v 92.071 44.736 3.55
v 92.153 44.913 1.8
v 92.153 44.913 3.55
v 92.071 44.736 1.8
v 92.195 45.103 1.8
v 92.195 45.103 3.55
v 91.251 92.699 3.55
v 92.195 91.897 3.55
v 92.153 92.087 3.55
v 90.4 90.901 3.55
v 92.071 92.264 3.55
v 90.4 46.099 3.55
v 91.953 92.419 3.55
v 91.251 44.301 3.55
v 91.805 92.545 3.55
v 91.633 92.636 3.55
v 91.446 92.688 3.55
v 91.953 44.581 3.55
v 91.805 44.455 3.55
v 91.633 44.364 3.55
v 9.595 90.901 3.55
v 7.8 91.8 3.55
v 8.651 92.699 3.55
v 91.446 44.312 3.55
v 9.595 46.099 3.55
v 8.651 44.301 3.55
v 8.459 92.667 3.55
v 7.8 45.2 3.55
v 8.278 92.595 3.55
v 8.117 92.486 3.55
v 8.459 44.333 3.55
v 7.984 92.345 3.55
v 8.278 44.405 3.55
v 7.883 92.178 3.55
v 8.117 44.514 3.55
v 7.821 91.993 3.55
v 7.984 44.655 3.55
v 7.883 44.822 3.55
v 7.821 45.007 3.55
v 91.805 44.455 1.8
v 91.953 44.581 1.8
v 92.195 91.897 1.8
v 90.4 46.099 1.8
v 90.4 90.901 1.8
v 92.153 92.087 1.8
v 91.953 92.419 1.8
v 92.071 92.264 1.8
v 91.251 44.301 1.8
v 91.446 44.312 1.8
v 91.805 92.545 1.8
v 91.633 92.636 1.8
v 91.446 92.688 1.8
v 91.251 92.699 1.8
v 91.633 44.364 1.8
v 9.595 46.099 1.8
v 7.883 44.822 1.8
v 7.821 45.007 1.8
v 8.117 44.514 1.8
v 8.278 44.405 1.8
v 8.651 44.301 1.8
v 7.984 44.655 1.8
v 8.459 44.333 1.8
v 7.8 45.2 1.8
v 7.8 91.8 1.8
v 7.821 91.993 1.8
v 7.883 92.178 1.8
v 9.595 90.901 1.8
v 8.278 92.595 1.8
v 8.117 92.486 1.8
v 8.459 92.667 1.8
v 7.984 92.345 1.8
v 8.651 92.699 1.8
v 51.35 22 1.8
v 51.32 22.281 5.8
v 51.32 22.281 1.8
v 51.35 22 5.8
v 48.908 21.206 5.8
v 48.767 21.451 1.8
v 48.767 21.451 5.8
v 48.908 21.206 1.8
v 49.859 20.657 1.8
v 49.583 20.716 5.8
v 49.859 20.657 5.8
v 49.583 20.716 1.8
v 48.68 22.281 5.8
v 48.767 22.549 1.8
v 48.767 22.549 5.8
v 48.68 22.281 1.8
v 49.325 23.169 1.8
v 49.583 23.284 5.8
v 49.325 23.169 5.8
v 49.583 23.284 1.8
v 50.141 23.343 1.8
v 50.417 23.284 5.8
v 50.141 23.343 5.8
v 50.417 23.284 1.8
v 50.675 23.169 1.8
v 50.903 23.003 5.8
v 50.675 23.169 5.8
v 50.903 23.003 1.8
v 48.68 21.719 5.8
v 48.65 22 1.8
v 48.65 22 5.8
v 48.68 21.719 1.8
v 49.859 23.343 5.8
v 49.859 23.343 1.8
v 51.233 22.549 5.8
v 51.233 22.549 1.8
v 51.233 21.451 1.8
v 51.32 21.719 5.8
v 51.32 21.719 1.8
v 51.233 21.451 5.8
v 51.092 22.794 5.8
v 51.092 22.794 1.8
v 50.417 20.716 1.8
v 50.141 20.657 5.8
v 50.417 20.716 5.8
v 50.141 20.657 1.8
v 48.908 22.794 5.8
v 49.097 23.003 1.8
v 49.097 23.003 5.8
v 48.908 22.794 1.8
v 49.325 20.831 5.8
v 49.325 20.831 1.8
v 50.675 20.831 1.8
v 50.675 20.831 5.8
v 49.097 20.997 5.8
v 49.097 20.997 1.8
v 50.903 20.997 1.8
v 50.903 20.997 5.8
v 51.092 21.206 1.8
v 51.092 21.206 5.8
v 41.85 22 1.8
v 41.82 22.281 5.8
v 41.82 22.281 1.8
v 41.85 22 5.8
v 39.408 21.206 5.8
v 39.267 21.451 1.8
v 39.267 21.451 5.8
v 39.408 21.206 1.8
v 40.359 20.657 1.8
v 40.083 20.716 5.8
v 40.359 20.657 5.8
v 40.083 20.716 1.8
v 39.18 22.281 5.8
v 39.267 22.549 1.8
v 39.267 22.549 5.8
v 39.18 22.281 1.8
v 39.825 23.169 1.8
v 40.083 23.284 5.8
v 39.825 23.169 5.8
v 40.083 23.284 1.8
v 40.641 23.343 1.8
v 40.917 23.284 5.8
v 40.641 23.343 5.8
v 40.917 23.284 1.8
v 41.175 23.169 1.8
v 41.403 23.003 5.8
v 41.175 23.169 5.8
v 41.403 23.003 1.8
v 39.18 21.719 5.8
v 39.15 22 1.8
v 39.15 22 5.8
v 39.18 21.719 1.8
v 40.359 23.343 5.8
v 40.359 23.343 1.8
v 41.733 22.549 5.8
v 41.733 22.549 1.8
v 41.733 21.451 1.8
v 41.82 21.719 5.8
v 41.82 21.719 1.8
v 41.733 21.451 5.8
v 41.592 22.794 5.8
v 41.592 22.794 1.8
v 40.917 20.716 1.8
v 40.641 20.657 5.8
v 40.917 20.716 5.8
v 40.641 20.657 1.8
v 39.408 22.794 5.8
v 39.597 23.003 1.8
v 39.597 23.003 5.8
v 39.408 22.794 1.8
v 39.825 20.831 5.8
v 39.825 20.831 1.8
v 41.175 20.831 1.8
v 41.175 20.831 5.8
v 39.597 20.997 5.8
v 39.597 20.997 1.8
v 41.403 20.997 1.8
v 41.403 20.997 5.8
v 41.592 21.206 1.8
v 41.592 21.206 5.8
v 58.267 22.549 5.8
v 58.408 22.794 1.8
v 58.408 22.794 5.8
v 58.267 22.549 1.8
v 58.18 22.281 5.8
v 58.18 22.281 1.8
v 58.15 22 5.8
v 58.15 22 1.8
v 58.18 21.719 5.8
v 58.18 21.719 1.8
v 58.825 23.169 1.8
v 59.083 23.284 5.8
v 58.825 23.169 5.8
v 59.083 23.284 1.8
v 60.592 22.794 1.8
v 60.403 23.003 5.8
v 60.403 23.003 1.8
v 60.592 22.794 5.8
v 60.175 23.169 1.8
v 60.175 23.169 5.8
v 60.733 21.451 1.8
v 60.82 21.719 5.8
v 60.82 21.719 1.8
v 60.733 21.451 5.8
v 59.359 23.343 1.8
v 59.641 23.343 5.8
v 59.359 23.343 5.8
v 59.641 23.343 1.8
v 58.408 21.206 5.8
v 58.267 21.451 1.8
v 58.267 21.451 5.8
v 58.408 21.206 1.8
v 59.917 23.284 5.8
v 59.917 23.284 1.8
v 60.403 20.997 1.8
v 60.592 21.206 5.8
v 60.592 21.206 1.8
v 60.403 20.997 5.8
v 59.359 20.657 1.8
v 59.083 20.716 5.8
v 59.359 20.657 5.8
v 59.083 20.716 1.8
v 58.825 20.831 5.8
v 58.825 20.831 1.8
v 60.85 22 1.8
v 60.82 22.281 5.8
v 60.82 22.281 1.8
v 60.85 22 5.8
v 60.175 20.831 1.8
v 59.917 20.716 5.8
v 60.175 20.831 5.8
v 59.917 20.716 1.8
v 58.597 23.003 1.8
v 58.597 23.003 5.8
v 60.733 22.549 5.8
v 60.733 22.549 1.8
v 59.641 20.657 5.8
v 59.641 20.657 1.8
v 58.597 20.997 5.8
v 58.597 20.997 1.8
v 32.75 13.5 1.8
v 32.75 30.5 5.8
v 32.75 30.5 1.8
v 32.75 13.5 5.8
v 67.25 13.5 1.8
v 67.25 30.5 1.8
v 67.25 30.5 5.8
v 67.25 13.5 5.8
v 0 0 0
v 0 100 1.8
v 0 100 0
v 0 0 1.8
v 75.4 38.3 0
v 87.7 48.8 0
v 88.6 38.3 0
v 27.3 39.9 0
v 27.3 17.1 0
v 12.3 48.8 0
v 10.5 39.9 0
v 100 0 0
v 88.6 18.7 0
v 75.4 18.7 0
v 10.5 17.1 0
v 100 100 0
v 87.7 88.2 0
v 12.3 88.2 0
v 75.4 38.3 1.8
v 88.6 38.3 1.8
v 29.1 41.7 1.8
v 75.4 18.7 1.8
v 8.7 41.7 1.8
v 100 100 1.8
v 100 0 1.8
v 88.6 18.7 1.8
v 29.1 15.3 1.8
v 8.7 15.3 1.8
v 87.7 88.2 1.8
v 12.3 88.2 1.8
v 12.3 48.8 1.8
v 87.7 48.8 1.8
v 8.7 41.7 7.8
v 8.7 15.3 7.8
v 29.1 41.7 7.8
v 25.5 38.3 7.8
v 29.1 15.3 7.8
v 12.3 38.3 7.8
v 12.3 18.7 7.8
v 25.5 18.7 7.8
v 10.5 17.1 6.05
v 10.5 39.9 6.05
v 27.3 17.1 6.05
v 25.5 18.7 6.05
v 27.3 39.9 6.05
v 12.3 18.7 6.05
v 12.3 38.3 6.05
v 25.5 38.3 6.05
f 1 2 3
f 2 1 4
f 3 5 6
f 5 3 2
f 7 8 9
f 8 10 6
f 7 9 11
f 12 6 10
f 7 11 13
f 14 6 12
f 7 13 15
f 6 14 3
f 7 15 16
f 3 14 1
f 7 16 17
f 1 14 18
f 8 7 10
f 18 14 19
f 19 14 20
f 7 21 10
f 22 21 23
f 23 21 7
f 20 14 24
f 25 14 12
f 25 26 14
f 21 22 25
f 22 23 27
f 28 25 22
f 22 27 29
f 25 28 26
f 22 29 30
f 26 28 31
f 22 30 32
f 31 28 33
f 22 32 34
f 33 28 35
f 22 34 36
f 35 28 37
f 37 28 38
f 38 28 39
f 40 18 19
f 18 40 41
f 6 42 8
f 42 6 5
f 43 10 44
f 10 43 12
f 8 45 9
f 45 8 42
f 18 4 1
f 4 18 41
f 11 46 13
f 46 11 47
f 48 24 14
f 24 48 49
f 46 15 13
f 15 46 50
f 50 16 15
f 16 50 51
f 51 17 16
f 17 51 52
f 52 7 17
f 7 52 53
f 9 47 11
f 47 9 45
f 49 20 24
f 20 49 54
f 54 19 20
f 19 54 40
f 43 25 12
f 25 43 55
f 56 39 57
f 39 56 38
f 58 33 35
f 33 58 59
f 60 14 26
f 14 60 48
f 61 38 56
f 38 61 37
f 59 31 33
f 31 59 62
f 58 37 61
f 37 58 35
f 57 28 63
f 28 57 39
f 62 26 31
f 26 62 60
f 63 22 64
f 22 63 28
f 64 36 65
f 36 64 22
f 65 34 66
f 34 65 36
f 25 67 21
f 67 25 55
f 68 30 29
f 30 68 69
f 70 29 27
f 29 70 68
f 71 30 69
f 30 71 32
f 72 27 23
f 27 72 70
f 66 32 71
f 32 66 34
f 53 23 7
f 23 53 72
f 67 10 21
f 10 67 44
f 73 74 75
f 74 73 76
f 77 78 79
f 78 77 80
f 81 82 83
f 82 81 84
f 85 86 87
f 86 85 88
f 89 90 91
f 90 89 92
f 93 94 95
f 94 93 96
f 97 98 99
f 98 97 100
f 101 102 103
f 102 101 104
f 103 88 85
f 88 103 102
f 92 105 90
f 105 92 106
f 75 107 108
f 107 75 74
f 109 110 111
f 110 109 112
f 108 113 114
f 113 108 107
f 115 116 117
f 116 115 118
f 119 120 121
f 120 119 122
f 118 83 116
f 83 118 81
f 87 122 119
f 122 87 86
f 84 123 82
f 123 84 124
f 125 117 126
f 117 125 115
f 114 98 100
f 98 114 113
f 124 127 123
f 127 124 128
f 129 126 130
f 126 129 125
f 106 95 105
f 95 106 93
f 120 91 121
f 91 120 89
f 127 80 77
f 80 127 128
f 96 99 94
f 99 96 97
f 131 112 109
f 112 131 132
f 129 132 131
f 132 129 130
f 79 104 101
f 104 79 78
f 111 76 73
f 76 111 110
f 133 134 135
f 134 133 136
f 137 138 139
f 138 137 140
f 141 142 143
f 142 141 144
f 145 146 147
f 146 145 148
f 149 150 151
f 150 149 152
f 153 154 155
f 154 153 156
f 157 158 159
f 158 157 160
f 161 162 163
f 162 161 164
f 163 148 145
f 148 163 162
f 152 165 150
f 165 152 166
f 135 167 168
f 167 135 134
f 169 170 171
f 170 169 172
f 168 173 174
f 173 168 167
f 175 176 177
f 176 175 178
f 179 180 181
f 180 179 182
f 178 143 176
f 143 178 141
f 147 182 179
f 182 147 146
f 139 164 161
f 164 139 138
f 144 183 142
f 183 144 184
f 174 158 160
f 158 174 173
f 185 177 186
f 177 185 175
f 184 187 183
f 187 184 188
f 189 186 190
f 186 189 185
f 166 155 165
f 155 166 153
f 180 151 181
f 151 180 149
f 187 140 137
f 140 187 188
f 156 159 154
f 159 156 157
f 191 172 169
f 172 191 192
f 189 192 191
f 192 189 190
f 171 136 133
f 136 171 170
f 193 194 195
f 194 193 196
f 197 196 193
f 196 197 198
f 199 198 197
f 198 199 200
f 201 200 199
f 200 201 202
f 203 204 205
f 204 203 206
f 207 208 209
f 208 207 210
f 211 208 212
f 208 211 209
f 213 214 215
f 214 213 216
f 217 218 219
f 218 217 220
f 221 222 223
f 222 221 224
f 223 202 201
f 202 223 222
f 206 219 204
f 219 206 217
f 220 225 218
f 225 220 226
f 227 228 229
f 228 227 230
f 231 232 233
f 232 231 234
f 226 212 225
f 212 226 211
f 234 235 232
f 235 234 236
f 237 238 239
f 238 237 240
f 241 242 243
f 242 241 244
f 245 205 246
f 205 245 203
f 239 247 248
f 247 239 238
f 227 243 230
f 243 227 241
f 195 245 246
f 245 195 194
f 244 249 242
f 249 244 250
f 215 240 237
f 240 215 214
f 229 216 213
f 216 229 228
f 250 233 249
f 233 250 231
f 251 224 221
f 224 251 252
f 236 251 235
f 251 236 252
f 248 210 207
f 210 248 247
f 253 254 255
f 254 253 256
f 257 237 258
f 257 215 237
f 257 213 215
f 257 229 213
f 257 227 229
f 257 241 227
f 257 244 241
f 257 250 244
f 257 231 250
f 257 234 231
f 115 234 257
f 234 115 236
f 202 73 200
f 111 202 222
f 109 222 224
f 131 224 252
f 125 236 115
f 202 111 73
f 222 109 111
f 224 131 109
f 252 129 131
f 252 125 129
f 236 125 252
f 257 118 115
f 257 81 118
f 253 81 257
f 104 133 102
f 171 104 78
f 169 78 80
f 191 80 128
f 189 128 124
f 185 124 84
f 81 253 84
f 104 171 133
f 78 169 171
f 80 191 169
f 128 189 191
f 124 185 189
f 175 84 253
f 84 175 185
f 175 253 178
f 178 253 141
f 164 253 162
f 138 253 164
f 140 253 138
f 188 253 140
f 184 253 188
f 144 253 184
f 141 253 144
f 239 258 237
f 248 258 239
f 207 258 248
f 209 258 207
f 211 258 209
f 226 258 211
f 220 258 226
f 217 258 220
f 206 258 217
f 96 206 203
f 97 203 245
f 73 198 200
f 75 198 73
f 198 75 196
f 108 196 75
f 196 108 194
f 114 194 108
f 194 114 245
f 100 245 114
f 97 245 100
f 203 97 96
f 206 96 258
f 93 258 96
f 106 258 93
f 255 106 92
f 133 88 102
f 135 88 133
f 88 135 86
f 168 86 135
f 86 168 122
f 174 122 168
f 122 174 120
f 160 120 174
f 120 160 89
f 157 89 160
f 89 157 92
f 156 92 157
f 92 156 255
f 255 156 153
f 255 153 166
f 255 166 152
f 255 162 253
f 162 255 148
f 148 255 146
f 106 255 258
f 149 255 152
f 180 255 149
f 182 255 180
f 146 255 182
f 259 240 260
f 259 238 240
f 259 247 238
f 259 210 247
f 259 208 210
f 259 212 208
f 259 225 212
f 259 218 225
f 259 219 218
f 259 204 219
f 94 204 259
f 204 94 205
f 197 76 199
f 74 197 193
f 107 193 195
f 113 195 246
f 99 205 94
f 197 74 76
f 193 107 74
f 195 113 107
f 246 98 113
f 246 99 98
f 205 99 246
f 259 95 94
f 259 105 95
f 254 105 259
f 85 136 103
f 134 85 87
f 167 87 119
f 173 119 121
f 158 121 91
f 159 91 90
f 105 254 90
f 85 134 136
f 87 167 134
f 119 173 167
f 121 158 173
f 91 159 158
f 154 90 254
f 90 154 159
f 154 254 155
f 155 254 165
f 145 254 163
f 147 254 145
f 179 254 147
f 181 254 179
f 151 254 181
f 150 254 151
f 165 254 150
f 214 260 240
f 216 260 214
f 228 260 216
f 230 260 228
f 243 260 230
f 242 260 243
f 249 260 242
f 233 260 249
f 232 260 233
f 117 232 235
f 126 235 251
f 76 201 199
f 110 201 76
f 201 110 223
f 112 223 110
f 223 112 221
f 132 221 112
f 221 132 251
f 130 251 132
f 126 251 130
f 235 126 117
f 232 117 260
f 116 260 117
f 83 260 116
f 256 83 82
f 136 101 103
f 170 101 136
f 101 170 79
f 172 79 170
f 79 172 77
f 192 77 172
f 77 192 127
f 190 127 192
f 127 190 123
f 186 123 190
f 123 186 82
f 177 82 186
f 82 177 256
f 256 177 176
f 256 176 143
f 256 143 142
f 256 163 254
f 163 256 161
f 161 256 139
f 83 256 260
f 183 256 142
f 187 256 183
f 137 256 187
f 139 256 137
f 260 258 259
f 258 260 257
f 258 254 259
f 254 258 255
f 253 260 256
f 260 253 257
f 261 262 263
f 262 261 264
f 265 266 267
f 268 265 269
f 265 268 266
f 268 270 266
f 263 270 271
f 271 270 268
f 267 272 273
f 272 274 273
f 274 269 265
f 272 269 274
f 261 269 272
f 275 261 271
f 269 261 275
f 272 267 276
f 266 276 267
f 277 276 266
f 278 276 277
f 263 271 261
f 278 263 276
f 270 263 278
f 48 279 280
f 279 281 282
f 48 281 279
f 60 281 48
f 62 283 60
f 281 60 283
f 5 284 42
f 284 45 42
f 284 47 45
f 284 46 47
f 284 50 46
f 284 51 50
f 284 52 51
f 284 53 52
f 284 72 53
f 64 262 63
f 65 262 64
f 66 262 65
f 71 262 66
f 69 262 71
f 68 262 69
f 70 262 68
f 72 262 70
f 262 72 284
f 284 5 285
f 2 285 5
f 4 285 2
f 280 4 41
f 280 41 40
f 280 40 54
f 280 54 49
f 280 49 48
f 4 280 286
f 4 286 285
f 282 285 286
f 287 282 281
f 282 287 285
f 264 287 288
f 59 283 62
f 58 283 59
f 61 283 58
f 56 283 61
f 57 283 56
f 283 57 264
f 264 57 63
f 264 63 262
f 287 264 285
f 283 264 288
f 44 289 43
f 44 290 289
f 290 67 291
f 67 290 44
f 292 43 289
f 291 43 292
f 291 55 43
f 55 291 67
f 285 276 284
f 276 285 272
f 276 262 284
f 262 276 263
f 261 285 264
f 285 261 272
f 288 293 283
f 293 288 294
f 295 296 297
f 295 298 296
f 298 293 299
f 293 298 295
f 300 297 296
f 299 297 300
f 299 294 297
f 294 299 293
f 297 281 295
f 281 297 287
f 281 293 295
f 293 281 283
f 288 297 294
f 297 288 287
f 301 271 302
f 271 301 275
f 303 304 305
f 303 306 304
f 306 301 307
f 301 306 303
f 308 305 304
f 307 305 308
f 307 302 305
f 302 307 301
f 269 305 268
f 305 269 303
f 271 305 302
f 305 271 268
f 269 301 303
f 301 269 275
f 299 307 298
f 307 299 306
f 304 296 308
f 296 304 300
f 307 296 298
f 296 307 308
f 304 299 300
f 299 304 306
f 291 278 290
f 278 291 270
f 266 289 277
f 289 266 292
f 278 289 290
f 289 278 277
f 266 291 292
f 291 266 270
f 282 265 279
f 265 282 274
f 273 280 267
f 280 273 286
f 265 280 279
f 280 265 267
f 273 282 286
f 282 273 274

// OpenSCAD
// Control Panel for simple prop controller
// Adrian McCarthy 2023-02-12

module thread(h, tap_d, pitch, tooth_h, nozzle_d=0.4) {
    r = (tap_d + nozzle_d) / 2;

    facets =
        ($fn > 0) ? max(3, $fn)
                  : max(5, ceil(min(360/$fa, 2*PI*r / $fs)));
    dtheta = 360 / facets;
    echo(str("dtheta for threads = ", dtheta));

    module wedge() {
        rotate([1.5, 0, 0]) rotate([0, 0, -(dtheta+0.1)/2])
            rotate_extrude(angle=dtheta+0.1, convexity=10)
                translate([r, 0])
                    polygon([
                        [tooth_h, 0],
                        [0, -pitch/2],
                        [-0.1, -pitch/2],
                        [-0.1, pitch/2],
                        [0, pitch/2]
                    ]);
    }

    for (theta = [-180 : dtheta : h*360/pitch + 180]) {
        rotate([0, 0, theta]) translate([0, 0, pitch*theta/360])
            wedge();
    }
}


// Arcade Button
// https://www.adafruit.com/product/3489
//
function arcadebtn_size(panel_th=0) = [ 33.3, 33.3, 10 ];

module arcadebtn_support(panel_th, nozzle_d=0.4) {
    button_dia   = arcadebtn_size().x;
    button_depth = arcadebtn_size().z;
    translate([0, 0, panel_th/2 - button_depth])
        cylinder(h=button_depth, d=button_dia);
}

module arcadebtn_cutout(panel_th, nozzle_d=0.4) {
    button_dia   = arcadebtn_size().x;
    button_depth = arcadebtn_size().z;
    // Thread size is M28-2
    // https://www.geocities.ws/qxb4tech/mthreadfine1_28.html
    tap_d = 26;
    pitch = 2;
    tooth_h = 1.227;

    translate([0, 0, panel_th/2 - button_depth - 0.1]) {
        cylinder(h=button_depth+0.2, d=tap_d + nozzle_d);
        intersection() {
            cylinder(h=button_depth-3, d=button_dia);
            thread(h=button_depth-3, tap_d=tap_d, pitch=pitch,
                   tooth_h=tooth_h, nozzle_d=nozzle_d);
        }
        translate([0, 0, button_depth-3+0.1])
            cylinder(h=3+0.1, d=28);
    }
}


// Relay Module
// XY-WJ01 Programmable Relay
// https://www.mpja.com/download/35874rldata.pdf
function relaymod_size(panel_th=0) = [79, 43];

module relaymod_cutout(panel_th, nozzle_d=0.4) {
    cutout_w = 75 + nozzle_d;
    cutout_h = 39 + nozzle_d;
    cube([cutout_w, cutout_h, panel_th+0.1], center=true);
}

module relaymod_bracing(panel_th, nozzle_d=0.4) {
    brace_th = panel_th;
    margin = max(min(4, brace_th), brace_th/2);
    left = -(relaymod_size().x/2 + margin);
    top = relaymod_size().y/2 + margin;
    right = -left;
    bottom = -top;

    module brace(p0, p1) {
        translate([0, 0, -panel_th+0.1]) {
            linear_extrude(brace_th + 0.1, convexity=4, center=true) {
                hull() {
                    translate(p0) circle(d=brace_th, $fs=nozzle_d/2);
                    translate(p1) circle(d=brace_th, $fs=nozzle_d/2);
                }
            }
        }
    }

    brace([left, top],     [left, bottom]);
    brace([left, bottom],  [right, bottom]);
    brace([right, bottom], [right, top]);
    brace([right, top],    [left, top]);
}


// Rocker Switch
// Daier KCD-101 rocker switch
// https://www.chinadaier.com/kcd1-101-10-amp-rocker-switch/
function rocker_size(panel_th=0) = [15, 21];

module rocker_cutout(panel_th, nozzle_d=0.4) {
    cutout_w = 13.2;
    cutout_h = 19.2 + nozzle_d;
    cube([cutout_w, cutout_h, panel_th+0.1], center=true);
}

function recessed_rocker_size(panel_th) = [
    rocker_size(panel_th).x + panel_th,
    rocker_size(panel_th).y + panel_th, 6
];

module recessed_rocker_support(panel_th, nozzle_d=0.4) {
    support_w = recessed_rocker_size(panel_th).x + 2*panel_th;
    support_h = recessed_rocker_size(panel_th).y + 2*panel_th;
    support_d = recessed_rocker_size(panel_th).z + panel_th;
    translate([0, 0, (panel_th - support_d)/2])
        cube([support_w, support_h, support_d], center=true);
}

module recessed_rocker_cutout(panel_th, nozzle_d=0.4) {
    recess_w = recessed_rocker_size(panel_th).x;
    recess_h = recessed_rocker_size(panel_th).y;
    recess_d = recessed_rocker_size(panel_th).z;
    translate([0, 0, (panel_th - recess_d)/2]) {
        cube([recess_w, recess_h, recess_d+0.1], center=true);
        translate([0, 0, -(recess_d+panel_th)/2])
            rocker_cutout(panel_th, nozzle_d);
    }        
}
    

// Terminal Block
// This is for smallish "European" style screw terminals.
module terminal_block_support(channels=4, panel_th, nozzle_d=0.4) {
    terminal_w = 6;
    spacer_w   = 3.5;
    support_w = terminal_w*channels + spacer_w*(channels-1);
    support_h = 17;
    support_d = 4;
    translate([0, 0, -(support_d + panel_th)/2]) {
        difference() {
            cube([support_w, support_h, support_d], center=true);
            translate([0, 0, -panel_th]) {
                for (i = [0:2:channels]) {
                    dx = (terminal_w + spacer_w)*i/2;
                    translate([dx, 0, 0])
                        cylinder(d=2.5 + nozzle_d/2, h=10, center=true, $fs=nozzle_d/2);
                    translate([-dx, 0, 0])
                        cylinder(d=2.5 + nozzle_d/2, h=10, center=true, $fs=nozzle_d/2);
                }
            }
        }
    }
}

module prop_control_panel(
    panel_w=100, panel_h=100, panel_th=2,
    print_orientation=false,
    nozzle_d=0.4
) {
    module panel() {
        translate([0, 0, -panel_th/2])
            cube([panel_w, panel_h, panel_th]);
    }
    
    module orient() {
        if (print_orientation) {
            translate([panel_w, 0, panel_th/2]) rotate([0, 180, 0]) {
                children();
            }
        } else {
            children();
        }
    }
    
    relaymod_pos = [panel_w/2, panel_h-relaymod_size().y/2 - 10, 0];
    rocker_pos =
        [relaymod_pos.x - relaymod_size().x/2 + rocker_size().x/2,
         relaymod_pos.y - relaymod_size().y/2 - rocker_size().y/2 - 8];
    
    recessed_pos =
        [relaymod_pos.x + relaymod_size().x/2 - recessed_rocker_size(panel_th).x/2,
         rocker_pos.y];

    terminal_pos =
        [panel_w/2, relaymod_pos.y - relaymod_size().y/2 - 25];

    orient() {
        difference() {
            union() {
                panel();
                translate(relaymod_pos)
                    relaymod_bracing(panel_th, nozzle_d);
                translate(recessed_pos)
                    recessed_rocker_support(panel_th, nozzle_d);
                translate(terminal_pos)
                    terminal_block_support(4, panel_th, nozzle_d);
            }
            translate(relaymod_pos)
                relaymod_cutout(panel_th, nozzle_d);
            translate(rocker_pos)
                rocker_cutout(panel_th, nozzle_d);
            translate(recessed_pos)
                recessed_rocker_cutout(panel_th, nozzle_d);
        }
    }
}

prop_control_panel(panel_th=1.8, print_orientation=!$preview);
